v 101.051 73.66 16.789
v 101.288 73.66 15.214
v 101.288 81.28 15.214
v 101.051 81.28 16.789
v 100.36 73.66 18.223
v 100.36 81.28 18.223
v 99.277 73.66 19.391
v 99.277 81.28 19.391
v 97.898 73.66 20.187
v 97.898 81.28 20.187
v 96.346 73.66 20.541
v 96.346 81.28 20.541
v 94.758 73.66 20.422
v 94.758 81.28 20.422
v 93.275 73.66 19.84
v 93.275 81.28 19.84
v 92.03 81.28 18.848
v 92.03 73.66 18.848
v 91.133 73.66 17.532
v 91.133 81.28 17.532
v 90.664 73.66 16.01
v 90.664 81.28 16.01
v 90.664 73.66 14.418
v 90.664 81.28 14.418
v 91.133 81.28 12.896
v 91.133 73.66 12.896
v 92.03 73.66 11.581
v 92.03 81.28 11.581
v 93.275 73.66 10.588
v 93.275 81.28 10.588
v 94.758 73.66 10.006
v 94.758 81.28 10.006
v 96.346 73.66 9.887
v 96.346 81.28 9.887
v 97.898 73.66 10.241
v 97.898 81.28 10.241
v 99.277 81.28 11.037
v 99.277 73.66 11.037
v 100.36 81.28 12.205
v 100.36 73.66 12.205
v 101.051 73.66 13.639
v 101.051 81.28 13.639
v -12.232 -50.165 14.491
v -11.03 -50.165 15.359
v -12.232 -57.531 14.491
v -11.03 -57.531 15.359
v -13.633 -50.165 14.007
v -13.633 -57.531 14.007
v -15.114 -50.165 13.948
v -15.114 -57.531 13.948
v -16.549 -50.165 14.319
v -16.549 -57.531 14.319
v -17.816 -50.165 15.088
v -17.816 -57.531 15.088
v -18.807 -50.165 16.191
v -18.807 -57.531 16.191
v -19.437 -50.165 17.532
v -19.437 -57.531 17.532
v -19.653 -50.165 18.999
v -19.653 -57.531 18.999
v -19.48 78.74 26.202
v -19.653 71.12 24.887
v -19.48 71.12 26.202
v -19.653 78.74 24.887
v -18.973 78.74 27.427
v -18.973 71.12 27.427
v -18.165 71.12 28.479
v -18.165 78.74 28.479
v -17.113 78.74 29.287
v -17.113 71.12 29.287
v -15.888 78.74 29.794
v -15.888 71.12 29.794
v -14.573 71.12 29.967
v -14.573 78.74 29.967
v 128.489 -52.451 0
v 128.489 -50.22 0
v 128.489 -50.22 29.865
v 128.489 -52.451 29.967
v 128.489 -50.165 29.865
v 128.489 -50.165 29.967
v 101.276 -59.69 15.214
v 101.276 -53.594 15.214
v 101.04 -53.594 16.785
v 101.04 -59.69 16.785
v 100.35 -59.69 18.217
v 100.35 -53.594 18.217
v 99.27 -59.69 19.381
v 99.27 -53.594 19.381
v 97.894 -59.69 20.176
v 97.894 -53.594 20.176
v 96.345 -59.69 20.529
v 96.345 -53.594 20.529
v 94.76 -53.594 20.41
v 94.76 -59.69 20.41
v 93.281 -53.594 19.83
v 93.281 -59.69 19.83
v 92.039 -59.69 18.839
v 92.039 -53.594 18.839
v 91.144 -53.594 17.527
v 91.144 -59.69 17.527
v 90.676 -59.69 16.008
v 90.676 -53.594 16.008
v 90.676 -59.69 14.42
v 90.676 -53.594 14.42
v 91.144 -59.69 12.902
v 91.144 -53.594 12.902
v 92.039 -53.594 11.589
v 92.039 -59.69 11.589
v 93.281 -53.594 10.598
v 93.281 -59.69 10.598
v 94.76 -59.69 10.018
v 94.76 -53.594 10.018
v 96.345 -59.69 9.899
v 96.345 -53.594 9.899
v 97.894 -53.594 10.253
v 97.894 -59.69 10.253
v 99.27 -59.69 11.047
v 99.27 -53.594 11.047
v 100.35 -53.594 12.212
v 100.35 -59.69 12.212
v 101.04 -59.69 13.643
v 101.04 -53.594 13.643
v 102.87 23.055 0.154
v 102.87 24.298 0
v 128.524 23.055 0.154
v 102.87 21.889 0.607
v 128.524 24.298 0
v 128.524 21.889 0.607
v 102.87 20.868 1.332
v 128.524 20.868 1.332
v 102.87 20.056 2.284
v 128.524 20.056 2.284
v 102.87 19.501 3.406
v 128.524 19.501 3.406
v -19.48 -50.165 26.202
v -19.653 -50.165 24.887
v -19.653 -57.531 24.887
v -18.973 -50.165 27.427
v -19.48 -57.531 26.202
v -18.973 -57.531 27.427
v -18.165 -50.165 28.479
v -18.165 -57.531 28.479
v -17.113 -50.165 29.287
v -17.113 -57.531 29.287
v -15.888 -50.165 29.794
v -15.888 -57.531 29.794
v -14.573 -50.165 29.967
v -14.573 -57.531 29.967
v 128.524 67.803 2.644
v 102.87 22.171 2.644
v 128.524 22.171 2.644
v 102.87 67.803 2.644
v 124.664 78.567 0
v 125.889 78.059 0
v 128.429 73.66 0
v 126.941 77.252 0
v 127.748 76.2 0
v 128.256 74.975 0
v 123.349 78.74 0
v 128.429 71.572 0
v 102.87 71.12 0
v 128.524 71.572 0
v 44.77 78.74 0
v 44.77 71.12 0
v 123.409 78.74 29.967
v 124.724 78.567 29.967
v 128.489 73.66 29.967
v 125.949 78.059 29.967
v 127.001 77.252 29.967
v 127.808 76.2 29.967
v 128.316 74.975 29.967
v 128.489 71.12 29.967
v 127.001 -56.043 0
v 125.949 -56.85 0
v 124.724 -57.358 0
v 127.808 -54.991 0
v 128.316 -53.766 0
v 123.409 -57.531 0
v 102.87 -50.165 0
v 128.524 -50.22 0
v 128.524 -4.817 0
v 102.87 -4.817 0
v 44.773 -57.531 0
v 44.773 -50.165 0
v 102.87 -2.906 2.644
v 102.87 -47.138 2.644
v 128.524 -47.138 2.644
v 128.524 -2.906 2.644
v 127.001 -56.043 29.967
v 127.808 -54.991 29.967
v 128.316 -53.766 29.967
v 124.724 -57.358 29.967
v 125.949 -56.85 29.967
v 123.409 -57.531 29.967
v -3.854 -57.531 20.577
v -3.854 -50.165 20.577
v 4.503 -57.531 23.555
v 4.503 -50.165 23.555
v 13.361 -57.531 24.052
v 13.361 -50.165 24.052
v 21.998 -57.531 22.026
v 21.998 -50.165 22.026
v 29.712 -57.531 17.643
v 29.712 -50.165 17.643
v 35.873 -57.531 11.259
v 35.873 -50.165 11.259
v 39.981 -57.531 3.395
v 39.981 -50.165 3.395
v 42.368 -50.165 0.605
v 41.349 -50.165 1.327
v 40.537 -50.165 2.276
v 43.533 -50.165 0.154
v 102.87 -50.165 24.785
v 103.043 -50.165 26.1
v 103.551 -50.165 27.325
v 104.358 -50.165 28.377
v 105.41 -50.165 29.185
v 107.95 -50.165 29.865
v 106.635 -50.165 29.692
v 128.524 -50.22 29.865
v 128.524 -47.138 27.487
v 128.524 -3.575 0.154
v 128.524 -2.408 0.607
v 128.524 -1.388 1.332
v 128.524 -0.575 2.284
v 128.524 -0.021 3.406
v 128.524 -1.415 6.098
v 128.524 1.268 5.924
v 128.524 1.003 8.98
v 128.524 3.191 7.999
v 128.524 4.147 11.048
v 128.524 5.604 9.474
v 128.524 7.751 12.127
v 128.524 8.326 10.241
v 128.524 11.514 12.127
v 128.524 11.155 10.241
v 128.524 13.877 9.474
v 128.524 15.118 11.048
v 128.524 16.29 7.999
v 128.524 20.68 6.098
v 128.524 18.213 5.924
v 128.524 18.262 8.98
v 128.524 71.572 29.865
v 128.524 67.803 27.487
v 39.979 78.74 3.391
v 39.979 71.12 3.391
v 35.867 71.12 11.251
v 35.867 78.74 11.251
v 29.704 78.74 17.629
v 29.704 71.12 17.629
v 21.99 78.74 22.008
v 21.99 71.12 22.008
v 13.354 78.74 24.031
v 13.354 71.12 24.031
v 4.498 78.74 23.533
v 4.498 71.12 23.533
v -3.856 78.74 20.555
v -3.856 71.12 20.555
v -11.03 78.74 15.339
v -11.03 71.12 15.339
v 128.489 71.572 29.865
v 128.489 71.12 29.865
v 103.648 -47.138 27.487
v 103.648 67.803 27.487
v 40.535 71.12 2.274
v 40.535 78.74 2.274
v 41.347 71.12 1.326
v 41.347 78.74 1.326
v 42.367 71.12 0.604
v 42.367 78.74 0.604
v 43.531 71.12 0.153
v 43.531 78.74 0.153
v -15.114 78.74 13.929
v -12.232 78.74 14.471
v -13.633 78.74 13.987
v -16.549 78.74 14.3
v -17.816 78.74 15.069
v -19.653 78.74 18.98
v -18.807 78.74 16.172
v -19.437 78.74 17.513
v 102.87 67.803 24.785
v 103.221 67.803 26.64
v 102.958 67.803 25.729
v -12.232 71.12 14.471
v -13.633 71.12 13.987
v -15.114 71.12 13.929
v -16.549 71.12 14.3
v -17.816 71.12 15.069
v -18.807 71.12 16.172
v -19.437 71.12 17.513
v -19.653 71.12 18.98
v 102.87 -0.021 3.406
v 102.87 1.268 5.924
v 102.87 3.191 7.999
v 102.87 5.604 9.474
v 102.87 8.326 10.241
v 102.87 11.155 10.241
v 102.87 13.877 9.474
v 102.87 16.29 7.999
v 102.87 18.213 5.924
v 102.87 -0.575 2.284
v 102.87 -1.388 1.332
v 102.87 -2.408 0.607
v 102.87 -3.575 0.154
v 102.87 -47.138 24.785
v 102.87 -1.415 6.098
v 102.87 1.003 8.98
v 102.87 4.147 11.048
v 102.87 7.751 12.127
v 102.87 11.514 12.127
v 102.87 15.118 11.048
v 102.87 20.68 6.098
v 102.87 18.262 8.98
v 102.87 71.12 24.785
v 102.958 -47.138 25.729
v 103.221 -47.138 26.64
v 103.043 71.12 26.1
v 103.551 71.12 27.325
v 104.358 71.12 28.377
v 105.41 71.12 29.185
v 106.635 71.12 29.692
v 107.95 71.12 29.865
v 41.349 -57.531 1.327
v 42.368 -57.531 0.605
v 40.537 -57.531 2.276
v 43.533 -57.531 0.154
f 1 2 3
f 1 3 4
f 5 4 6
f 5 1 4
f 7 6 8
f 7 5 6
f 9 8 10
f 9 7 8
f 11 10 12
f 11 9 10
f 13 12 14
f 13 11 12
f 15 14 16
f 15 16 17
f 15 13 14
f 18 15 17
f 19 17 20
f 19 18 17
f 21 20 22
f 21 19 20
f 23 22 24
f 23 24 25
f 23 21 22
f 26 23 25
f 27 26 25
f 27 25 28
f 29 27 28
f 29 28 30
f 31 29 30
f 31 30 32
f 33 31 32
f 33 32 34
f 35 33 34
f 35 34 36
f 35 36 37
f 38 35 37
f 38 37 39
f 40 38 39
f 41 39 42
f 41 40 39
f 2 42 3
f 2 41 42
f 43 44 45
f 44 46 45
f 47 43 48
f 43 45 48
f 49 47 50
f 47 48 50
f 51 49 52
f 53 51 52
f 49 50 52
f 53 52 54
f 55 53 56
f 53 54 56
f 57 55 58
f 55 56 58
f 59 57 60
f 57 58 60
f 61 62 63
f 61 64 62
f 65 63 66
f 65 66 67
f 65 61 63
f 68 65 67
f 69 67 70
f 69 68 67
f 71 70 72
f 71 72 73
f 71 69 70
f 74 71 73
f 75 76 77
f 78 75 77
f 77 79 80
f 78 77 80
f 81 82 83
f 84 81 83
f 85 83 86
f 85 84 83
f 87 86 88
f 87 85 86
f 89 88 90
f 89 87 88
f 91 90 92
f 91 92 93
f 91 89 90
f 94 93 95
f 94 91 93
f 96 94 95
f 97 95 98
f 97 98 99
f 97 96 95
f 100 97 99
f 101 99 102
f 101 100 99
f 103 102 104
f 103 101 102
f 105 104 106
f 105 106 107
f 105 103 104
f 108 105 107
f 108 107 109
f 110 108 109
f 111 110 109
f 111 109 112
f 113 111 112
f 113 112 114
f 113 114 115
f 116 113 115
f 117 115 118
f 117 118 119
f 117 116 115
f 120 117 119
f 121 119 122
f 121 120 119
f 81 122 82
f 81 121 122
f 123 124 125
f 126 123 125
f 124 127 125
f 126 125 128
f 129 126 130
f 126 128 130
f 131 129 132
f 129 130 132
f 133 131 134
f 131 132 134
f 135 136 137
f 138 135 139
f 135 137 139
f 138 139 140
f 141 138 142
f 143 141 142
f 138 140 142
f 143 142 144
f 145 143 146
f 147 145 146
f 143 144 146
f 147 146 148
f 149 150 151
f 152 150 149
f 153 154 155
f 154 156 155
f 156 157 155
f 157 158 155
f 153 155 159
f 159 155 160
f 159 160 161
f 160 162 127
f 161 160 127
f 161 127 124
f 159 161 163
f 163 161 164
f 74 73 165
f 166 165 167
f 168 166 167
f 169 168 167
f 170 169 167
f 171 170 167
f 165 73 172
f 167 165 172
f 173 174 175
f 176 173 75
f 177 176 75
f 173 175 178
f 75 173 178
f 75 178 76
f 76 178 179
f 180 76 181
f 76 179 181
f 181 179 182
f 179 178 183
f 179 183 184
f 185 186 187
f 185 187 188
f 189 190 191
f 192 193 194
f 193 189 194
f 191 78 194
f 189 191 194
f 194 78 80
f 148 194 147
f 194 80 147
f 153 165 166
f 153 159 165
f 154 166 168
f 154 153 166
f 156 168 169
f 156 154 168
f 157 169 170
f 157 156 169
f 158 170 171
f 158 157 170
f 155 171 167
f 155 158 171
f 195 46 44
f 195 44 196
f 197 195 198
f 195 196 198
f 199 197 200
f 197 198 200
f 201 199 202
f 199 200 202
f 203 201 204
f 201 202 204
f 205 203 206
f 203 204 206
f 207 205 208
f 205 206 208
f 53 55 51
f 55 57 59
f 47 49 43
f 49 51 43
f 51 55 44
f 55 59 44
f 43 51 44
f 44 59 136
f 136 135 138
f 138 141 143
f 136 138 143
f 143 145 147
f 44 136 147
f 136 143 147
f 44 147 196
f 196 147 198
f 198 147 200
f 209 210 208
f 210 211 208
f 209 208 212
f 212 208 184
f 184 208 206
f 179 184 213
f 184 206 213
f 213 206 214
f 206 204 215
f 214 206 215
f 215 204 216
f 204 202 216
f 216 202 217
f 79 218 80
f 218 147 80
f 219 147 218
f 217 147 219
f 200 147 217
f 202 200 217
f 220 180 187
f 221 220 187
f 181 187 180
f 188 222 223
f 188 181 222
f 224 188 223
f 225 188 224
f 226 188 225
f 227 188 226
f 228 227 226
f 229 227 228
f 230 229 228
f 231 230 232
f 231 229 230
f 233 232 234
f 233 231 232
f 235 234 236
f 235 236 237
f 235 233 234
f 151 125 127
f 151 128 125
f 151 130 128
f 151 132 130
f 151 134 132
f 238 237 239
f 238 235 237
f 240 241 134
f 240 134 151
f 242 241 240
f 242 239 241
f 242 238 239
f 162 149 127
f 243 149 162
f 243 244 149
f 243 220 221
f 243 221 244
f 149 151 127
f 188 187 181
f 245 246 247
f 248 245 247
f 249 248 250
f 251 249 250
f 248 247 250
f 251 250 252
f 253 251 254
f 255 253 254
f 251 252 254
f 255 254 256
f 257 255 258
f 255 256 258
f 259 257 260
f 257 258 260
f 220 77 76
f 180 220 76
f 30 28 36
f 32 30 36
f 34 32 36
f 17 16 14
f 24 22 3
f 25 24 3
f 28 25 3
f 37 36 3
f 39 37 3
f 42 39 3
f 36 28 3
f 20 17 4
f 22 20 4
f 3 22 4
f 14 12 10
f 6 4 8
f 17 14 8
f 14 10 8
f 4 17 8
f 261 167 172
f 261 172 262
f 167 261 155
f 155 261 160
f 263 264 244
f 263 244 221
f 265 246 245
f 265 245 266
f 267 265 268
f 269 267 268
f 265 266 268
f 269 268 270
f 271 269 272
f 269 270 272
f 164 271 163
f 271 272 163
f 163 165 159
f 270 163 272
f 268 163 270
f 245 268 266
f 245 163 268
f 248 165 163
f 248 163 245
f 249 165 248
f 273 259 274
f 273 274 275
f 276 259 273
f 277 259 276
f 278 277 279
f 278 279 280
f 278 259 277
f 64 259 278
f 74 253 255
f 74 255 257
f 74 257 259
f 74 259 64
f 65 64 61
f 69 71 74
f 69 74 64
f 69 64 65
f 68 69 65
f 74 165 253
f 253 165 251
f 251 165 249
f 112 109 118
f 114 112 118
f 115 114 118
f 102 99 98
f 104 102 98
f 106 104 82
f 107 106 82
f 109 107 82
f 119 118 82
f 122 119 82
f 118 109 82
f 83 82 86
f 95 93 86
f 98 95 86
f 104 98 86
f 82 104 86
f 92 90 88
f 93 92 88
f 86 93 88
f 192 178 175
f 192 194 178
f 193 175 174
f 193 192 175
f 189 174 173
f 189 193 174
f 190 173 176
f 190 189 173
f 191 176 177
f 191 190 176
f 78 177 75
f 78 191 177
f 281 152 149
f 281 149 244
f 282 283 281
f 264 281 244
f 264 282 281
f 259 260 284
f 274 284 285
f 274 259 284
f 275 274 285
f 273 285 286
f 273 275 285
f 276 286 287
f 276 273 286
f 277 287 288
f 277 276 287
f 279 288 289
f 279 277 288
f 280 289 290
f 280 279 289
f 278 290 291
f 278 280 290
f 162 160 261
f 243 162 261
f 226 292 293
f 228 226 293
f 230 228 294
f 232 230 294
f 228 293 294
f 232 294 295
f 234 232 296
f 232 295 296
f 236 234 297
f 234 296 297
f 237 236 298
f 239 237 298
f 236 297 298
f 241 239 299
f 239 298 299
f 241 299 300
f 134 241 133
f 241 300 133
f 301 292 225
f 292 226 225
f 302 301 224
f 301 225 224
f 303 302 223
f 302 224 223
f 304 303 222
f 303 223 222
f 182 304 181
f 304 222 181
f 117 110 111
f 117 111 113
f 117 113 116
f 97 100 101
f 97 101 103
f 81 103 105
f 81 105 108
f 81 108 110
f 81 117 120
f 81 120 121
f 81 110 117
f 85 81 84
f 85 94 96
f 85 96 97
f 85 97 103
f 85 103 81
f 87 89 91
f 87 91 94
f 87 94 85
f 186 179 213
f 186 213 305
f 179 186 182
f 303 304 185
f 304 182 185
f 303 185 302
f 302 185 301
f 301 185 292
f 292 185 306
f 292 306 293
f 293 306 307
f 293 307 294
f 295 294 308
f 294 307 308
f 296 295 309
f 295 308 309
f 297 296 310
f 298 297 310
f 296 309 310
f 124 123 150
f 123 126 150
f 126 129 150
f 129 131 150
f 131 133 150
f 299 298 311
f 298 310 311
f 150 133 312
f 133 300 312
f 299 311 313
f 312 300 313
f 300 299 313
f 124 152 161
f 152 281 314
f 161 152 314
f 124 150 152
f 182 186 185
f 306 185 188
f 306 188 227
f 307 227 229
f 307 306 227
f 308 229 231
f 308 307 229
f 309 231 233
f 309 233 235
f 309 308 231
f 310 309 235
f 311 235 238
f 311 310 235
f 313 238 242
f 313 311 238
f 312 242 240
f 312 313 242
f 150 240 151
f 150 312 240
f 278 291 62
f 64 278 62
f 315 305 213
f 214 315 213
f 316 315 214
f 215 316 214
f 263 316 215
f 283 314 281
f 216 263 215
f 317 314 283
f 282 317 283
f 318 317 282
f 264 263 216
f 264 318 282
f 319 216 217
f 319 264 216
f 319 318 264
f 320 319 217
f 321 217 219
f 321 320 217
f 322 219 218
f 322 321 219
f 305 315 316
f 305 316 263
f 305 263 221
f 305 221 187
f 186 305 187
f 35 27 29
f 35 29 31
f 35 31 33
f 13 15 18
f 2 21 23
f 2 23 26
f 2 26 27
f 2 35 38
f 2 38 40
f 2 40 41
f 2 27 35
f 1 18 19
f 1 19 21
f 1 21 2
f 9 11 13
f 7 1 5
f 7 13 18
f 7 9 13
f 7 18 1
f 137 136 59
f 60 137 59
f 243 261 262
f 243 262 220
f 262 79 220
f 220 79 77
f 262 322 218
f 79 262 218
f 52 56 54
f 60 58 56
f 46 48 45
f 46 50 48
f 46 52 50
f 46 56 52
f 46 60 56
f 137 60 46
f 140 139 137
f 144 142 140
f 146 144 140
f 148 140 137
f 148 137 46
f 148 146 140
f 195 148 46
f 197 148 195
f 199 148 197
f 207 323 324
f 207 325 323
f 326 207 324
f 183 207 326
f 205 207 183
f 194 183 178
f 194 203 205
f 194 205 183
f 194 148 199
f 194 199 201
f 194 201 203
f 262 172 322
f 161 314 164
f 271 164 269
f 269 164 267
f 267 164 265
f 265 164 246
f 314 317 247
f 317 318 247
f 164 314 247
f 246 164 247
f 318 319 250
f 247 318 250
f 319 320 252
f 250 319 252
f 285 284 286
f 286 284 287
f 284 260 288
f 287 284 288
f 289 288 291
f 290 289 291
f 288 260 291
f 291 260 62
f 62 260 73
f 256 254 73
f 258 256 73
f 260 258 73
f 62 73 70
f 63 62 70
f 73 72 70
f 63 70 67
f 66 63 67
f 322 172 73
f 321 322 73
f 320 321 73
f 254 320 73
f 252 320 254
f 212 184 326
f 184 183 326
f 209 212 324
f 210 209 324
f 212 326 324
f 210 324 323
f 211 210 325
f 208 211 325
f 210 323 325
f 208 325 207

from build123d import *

# Parameters (mm, degrees)
F1_START      = 50.165
F1_DEPTH      = 7.366
F3_START      = 102.87
F3_DEPTH      = 25.654
F5_DEPTH      = 156.845
F5_DEPTH_BACK = 153.67
F7_START      = 121.285
F7_DEPTH      = 7.62
F8_R          = 5.3299304063
F9_DEPTH      = 2.159
F9_DEPTH_BACK = 3.937
F11_START     = -133.35
F10_R         = 5.3420866917
F11_DEPTH     = 7.62
F12_R         = 5.08
F13_R         = 5.08
F14_R         = 5.08
F15_T1_DEPTH  = 121.285
F16_R         = 5.08


# Not quite as in the source:
# - a fillet or chamfer that OpenCascade refuses, or shapes differently, is made with other operations: its cross-section is extruded or revolved along the edge and cut away or added


with BuildPart() as f1:
    # F0 (on Front) → F1 (new body)
    with BuildSketch(Plane.XZ.offset(F1_START)):
        with BuildLine():
            Line((128.4888833761, 0), (128.4888833761, 29.9671925604))
            Line((128.4888833761, 29.9671925604), (-19.6533282994, 29.9671925604))
            Line((-19.6533282994, 29.9671925604), (-19.6533282994, 0))
            ThreePointArc((-19.6533282994, 0), (10.6539891214, 24.1701564864), (40.9613065422, 0))
            Line((40.9613065422, 0), (128.4888833761, 0))
        make_face()
    extrude(amount=F1_DEPTH)

    # F2 (on Right) → F3 (join)
    with BuildSketch(Plane.YZ.offset(F3_START)):
        with BuildLine():
            Line((71.5717085687, 29.865141958), (-50.2199567854, 29.865141958))
            Line((-50.2199567854, 29.865141958), (-50.2199567854, 0))
            Line((-50.2199567854, 0), (-0.5977698866, 0))
            ThreePointArc((-0.5977698866, 0), (9.740347974, 10.3381178606), (20.0784658346, 0))
            Line((20.0784658346, 0), (71.5717085687, 0))
            Line((71.5717085687, 0), (71.5717085687, 29.865141958))
        make_face()
    extrude(amount=F3_DEPTH)

    # F4 (on Right) → F5 (cut, two sides)
    with BuildSketch(Plane.YZ) as f5_sk:
        with BuildLine():
            Line((67.8030401468, 27.4865683168), (-47.1380576491, 27.4865683168))
            Line((-47.1380576491, 27.4865683168), (-47.1380576491, 2.6438338682))
            Line((-47.1380576491, 2.6438338682), (-2.90596069, 2.6438338682))
            ThreePointArc((-2.90596069, 2.6438338682), (9.6324179322, 12.2636161005), (22.1707965543, 2.6438338682))
            Line((22.1707965543, 2.6438338682), (67.8030401468, 2.6438338682))
            Line((67.8030401468, 2.6438338682), (67.8030401468, 27.4865683168))
        make_face()
    extrude(amount=-F5_DEPTH, mode=Mode.SUBTRACT)
    extrude(f5_sk.sketch, amount=F5_DEPTH_BACK, mode=Mode.SUBTRACT)

    # F6 (on face) → F7 (join)
    with BuildSketch(Plane(origin=(0, -50.165, 0), x_dir=(-1, 0, 0), z_dir=(0, 1, 0)).offset(F7_START)):
        with BuildLine():
            ThreePointArc((-40.9613065422, 0), (-10.6539891214, 24.1485546437), (19.6533282994, 0))
            Line((19.6533282994, 0), (19.6533282994, 29.9671925604))
            Line((19.6533282994, 29.9671925604), (-128.4888833761, 29.9671925604))
            Line((-128.4888833761, 29.9671925604), (-128.4290701151, 0))
            Line((-128.4290701151, 0), (-40.9613065422, 0))
        make_face()
    extrude(amount=F7_DEPTH)

    # F12
    f12_edges = [f1.edges().sort_by_distance(p)[0] for p in [
        (-19.653328, -53.848, 0),
        (-19.653328, 74.93, 0),
        (-19.653328, -53.848, 29.967193),
        (-19.653328, 74.93, 29.967193),
    ]]
    fillet(f12_edges, radius=F12_R)

    # F13
    f13_edges = [f1.edges().sort_by_distance(p)[0] for p in [
        (40.961307, -53.848, 0),
        (40.961307, 74.93, 0),
    ]]
    fillet(f13_edges, radius=F13_R)

    # F14
    f14_edges = [f1.edges().sort_by_distance(p)[0] for p in [
        (115.697, -0.59777, 0),
        (115.697, 20.078466, 0),
    ]]
    fillet(f14_edges, radius=F14_R)

    # F15: fillet of radius 5.08 on 1 edges, made by hand

    # F15_s2 → F15_t1 (cut)
    with BuildSketch(Plane.XZ.offset(-71.12)):
        with BuildLine():
            ThreePointArc((102.87, 24.785141958), (104.3578975516, 28.3772444064), (107.95, 29.865141958))
            Line((107.95, 29.865141958), (102.87, 29.865141958))
            Line((102.87, 29.865141958), (102.87, 24.785141958))
        make_face()
    extrude(amount=F15_T1_DEPTH, mode=Mode.SUBTRACT)

    # F16
    f16_edges = [f1.edges().sort_by_distance(p)[0] for p in [
        (128.458977, 78.74, 14.983596),
        (128.488883, -57.531, 14.983596),
    ]]
    fillet(f16_edges, radius=F16_R)


with BuildPart() as f9:
    # F8 (on face) → F9 (new body, two sides)
    with BuildSketch(Plane.XZ.offset(57.531)) as f9_sk:
        with Locations((95.9464088082, 15.2141042054)):
            Circle(F8_R)
    extrude(amount=F9_DEPTH)
    extrude(f9_sk.sketch, amount=-F9_DEPTH_BACK)


with BuildPart() as f11:
    # F10 (on face) → F11 (new body)
    with BuildSketch(Plane.XZ.offset(59.69).offset(F11_START)):
        with Locations((95.9464088082, 15.2141042054)):
            Circle(F10_R)
    extrude(amount=-F11_DEPTH)


solid = Compound([f1.part, f9.part, f11.part])
